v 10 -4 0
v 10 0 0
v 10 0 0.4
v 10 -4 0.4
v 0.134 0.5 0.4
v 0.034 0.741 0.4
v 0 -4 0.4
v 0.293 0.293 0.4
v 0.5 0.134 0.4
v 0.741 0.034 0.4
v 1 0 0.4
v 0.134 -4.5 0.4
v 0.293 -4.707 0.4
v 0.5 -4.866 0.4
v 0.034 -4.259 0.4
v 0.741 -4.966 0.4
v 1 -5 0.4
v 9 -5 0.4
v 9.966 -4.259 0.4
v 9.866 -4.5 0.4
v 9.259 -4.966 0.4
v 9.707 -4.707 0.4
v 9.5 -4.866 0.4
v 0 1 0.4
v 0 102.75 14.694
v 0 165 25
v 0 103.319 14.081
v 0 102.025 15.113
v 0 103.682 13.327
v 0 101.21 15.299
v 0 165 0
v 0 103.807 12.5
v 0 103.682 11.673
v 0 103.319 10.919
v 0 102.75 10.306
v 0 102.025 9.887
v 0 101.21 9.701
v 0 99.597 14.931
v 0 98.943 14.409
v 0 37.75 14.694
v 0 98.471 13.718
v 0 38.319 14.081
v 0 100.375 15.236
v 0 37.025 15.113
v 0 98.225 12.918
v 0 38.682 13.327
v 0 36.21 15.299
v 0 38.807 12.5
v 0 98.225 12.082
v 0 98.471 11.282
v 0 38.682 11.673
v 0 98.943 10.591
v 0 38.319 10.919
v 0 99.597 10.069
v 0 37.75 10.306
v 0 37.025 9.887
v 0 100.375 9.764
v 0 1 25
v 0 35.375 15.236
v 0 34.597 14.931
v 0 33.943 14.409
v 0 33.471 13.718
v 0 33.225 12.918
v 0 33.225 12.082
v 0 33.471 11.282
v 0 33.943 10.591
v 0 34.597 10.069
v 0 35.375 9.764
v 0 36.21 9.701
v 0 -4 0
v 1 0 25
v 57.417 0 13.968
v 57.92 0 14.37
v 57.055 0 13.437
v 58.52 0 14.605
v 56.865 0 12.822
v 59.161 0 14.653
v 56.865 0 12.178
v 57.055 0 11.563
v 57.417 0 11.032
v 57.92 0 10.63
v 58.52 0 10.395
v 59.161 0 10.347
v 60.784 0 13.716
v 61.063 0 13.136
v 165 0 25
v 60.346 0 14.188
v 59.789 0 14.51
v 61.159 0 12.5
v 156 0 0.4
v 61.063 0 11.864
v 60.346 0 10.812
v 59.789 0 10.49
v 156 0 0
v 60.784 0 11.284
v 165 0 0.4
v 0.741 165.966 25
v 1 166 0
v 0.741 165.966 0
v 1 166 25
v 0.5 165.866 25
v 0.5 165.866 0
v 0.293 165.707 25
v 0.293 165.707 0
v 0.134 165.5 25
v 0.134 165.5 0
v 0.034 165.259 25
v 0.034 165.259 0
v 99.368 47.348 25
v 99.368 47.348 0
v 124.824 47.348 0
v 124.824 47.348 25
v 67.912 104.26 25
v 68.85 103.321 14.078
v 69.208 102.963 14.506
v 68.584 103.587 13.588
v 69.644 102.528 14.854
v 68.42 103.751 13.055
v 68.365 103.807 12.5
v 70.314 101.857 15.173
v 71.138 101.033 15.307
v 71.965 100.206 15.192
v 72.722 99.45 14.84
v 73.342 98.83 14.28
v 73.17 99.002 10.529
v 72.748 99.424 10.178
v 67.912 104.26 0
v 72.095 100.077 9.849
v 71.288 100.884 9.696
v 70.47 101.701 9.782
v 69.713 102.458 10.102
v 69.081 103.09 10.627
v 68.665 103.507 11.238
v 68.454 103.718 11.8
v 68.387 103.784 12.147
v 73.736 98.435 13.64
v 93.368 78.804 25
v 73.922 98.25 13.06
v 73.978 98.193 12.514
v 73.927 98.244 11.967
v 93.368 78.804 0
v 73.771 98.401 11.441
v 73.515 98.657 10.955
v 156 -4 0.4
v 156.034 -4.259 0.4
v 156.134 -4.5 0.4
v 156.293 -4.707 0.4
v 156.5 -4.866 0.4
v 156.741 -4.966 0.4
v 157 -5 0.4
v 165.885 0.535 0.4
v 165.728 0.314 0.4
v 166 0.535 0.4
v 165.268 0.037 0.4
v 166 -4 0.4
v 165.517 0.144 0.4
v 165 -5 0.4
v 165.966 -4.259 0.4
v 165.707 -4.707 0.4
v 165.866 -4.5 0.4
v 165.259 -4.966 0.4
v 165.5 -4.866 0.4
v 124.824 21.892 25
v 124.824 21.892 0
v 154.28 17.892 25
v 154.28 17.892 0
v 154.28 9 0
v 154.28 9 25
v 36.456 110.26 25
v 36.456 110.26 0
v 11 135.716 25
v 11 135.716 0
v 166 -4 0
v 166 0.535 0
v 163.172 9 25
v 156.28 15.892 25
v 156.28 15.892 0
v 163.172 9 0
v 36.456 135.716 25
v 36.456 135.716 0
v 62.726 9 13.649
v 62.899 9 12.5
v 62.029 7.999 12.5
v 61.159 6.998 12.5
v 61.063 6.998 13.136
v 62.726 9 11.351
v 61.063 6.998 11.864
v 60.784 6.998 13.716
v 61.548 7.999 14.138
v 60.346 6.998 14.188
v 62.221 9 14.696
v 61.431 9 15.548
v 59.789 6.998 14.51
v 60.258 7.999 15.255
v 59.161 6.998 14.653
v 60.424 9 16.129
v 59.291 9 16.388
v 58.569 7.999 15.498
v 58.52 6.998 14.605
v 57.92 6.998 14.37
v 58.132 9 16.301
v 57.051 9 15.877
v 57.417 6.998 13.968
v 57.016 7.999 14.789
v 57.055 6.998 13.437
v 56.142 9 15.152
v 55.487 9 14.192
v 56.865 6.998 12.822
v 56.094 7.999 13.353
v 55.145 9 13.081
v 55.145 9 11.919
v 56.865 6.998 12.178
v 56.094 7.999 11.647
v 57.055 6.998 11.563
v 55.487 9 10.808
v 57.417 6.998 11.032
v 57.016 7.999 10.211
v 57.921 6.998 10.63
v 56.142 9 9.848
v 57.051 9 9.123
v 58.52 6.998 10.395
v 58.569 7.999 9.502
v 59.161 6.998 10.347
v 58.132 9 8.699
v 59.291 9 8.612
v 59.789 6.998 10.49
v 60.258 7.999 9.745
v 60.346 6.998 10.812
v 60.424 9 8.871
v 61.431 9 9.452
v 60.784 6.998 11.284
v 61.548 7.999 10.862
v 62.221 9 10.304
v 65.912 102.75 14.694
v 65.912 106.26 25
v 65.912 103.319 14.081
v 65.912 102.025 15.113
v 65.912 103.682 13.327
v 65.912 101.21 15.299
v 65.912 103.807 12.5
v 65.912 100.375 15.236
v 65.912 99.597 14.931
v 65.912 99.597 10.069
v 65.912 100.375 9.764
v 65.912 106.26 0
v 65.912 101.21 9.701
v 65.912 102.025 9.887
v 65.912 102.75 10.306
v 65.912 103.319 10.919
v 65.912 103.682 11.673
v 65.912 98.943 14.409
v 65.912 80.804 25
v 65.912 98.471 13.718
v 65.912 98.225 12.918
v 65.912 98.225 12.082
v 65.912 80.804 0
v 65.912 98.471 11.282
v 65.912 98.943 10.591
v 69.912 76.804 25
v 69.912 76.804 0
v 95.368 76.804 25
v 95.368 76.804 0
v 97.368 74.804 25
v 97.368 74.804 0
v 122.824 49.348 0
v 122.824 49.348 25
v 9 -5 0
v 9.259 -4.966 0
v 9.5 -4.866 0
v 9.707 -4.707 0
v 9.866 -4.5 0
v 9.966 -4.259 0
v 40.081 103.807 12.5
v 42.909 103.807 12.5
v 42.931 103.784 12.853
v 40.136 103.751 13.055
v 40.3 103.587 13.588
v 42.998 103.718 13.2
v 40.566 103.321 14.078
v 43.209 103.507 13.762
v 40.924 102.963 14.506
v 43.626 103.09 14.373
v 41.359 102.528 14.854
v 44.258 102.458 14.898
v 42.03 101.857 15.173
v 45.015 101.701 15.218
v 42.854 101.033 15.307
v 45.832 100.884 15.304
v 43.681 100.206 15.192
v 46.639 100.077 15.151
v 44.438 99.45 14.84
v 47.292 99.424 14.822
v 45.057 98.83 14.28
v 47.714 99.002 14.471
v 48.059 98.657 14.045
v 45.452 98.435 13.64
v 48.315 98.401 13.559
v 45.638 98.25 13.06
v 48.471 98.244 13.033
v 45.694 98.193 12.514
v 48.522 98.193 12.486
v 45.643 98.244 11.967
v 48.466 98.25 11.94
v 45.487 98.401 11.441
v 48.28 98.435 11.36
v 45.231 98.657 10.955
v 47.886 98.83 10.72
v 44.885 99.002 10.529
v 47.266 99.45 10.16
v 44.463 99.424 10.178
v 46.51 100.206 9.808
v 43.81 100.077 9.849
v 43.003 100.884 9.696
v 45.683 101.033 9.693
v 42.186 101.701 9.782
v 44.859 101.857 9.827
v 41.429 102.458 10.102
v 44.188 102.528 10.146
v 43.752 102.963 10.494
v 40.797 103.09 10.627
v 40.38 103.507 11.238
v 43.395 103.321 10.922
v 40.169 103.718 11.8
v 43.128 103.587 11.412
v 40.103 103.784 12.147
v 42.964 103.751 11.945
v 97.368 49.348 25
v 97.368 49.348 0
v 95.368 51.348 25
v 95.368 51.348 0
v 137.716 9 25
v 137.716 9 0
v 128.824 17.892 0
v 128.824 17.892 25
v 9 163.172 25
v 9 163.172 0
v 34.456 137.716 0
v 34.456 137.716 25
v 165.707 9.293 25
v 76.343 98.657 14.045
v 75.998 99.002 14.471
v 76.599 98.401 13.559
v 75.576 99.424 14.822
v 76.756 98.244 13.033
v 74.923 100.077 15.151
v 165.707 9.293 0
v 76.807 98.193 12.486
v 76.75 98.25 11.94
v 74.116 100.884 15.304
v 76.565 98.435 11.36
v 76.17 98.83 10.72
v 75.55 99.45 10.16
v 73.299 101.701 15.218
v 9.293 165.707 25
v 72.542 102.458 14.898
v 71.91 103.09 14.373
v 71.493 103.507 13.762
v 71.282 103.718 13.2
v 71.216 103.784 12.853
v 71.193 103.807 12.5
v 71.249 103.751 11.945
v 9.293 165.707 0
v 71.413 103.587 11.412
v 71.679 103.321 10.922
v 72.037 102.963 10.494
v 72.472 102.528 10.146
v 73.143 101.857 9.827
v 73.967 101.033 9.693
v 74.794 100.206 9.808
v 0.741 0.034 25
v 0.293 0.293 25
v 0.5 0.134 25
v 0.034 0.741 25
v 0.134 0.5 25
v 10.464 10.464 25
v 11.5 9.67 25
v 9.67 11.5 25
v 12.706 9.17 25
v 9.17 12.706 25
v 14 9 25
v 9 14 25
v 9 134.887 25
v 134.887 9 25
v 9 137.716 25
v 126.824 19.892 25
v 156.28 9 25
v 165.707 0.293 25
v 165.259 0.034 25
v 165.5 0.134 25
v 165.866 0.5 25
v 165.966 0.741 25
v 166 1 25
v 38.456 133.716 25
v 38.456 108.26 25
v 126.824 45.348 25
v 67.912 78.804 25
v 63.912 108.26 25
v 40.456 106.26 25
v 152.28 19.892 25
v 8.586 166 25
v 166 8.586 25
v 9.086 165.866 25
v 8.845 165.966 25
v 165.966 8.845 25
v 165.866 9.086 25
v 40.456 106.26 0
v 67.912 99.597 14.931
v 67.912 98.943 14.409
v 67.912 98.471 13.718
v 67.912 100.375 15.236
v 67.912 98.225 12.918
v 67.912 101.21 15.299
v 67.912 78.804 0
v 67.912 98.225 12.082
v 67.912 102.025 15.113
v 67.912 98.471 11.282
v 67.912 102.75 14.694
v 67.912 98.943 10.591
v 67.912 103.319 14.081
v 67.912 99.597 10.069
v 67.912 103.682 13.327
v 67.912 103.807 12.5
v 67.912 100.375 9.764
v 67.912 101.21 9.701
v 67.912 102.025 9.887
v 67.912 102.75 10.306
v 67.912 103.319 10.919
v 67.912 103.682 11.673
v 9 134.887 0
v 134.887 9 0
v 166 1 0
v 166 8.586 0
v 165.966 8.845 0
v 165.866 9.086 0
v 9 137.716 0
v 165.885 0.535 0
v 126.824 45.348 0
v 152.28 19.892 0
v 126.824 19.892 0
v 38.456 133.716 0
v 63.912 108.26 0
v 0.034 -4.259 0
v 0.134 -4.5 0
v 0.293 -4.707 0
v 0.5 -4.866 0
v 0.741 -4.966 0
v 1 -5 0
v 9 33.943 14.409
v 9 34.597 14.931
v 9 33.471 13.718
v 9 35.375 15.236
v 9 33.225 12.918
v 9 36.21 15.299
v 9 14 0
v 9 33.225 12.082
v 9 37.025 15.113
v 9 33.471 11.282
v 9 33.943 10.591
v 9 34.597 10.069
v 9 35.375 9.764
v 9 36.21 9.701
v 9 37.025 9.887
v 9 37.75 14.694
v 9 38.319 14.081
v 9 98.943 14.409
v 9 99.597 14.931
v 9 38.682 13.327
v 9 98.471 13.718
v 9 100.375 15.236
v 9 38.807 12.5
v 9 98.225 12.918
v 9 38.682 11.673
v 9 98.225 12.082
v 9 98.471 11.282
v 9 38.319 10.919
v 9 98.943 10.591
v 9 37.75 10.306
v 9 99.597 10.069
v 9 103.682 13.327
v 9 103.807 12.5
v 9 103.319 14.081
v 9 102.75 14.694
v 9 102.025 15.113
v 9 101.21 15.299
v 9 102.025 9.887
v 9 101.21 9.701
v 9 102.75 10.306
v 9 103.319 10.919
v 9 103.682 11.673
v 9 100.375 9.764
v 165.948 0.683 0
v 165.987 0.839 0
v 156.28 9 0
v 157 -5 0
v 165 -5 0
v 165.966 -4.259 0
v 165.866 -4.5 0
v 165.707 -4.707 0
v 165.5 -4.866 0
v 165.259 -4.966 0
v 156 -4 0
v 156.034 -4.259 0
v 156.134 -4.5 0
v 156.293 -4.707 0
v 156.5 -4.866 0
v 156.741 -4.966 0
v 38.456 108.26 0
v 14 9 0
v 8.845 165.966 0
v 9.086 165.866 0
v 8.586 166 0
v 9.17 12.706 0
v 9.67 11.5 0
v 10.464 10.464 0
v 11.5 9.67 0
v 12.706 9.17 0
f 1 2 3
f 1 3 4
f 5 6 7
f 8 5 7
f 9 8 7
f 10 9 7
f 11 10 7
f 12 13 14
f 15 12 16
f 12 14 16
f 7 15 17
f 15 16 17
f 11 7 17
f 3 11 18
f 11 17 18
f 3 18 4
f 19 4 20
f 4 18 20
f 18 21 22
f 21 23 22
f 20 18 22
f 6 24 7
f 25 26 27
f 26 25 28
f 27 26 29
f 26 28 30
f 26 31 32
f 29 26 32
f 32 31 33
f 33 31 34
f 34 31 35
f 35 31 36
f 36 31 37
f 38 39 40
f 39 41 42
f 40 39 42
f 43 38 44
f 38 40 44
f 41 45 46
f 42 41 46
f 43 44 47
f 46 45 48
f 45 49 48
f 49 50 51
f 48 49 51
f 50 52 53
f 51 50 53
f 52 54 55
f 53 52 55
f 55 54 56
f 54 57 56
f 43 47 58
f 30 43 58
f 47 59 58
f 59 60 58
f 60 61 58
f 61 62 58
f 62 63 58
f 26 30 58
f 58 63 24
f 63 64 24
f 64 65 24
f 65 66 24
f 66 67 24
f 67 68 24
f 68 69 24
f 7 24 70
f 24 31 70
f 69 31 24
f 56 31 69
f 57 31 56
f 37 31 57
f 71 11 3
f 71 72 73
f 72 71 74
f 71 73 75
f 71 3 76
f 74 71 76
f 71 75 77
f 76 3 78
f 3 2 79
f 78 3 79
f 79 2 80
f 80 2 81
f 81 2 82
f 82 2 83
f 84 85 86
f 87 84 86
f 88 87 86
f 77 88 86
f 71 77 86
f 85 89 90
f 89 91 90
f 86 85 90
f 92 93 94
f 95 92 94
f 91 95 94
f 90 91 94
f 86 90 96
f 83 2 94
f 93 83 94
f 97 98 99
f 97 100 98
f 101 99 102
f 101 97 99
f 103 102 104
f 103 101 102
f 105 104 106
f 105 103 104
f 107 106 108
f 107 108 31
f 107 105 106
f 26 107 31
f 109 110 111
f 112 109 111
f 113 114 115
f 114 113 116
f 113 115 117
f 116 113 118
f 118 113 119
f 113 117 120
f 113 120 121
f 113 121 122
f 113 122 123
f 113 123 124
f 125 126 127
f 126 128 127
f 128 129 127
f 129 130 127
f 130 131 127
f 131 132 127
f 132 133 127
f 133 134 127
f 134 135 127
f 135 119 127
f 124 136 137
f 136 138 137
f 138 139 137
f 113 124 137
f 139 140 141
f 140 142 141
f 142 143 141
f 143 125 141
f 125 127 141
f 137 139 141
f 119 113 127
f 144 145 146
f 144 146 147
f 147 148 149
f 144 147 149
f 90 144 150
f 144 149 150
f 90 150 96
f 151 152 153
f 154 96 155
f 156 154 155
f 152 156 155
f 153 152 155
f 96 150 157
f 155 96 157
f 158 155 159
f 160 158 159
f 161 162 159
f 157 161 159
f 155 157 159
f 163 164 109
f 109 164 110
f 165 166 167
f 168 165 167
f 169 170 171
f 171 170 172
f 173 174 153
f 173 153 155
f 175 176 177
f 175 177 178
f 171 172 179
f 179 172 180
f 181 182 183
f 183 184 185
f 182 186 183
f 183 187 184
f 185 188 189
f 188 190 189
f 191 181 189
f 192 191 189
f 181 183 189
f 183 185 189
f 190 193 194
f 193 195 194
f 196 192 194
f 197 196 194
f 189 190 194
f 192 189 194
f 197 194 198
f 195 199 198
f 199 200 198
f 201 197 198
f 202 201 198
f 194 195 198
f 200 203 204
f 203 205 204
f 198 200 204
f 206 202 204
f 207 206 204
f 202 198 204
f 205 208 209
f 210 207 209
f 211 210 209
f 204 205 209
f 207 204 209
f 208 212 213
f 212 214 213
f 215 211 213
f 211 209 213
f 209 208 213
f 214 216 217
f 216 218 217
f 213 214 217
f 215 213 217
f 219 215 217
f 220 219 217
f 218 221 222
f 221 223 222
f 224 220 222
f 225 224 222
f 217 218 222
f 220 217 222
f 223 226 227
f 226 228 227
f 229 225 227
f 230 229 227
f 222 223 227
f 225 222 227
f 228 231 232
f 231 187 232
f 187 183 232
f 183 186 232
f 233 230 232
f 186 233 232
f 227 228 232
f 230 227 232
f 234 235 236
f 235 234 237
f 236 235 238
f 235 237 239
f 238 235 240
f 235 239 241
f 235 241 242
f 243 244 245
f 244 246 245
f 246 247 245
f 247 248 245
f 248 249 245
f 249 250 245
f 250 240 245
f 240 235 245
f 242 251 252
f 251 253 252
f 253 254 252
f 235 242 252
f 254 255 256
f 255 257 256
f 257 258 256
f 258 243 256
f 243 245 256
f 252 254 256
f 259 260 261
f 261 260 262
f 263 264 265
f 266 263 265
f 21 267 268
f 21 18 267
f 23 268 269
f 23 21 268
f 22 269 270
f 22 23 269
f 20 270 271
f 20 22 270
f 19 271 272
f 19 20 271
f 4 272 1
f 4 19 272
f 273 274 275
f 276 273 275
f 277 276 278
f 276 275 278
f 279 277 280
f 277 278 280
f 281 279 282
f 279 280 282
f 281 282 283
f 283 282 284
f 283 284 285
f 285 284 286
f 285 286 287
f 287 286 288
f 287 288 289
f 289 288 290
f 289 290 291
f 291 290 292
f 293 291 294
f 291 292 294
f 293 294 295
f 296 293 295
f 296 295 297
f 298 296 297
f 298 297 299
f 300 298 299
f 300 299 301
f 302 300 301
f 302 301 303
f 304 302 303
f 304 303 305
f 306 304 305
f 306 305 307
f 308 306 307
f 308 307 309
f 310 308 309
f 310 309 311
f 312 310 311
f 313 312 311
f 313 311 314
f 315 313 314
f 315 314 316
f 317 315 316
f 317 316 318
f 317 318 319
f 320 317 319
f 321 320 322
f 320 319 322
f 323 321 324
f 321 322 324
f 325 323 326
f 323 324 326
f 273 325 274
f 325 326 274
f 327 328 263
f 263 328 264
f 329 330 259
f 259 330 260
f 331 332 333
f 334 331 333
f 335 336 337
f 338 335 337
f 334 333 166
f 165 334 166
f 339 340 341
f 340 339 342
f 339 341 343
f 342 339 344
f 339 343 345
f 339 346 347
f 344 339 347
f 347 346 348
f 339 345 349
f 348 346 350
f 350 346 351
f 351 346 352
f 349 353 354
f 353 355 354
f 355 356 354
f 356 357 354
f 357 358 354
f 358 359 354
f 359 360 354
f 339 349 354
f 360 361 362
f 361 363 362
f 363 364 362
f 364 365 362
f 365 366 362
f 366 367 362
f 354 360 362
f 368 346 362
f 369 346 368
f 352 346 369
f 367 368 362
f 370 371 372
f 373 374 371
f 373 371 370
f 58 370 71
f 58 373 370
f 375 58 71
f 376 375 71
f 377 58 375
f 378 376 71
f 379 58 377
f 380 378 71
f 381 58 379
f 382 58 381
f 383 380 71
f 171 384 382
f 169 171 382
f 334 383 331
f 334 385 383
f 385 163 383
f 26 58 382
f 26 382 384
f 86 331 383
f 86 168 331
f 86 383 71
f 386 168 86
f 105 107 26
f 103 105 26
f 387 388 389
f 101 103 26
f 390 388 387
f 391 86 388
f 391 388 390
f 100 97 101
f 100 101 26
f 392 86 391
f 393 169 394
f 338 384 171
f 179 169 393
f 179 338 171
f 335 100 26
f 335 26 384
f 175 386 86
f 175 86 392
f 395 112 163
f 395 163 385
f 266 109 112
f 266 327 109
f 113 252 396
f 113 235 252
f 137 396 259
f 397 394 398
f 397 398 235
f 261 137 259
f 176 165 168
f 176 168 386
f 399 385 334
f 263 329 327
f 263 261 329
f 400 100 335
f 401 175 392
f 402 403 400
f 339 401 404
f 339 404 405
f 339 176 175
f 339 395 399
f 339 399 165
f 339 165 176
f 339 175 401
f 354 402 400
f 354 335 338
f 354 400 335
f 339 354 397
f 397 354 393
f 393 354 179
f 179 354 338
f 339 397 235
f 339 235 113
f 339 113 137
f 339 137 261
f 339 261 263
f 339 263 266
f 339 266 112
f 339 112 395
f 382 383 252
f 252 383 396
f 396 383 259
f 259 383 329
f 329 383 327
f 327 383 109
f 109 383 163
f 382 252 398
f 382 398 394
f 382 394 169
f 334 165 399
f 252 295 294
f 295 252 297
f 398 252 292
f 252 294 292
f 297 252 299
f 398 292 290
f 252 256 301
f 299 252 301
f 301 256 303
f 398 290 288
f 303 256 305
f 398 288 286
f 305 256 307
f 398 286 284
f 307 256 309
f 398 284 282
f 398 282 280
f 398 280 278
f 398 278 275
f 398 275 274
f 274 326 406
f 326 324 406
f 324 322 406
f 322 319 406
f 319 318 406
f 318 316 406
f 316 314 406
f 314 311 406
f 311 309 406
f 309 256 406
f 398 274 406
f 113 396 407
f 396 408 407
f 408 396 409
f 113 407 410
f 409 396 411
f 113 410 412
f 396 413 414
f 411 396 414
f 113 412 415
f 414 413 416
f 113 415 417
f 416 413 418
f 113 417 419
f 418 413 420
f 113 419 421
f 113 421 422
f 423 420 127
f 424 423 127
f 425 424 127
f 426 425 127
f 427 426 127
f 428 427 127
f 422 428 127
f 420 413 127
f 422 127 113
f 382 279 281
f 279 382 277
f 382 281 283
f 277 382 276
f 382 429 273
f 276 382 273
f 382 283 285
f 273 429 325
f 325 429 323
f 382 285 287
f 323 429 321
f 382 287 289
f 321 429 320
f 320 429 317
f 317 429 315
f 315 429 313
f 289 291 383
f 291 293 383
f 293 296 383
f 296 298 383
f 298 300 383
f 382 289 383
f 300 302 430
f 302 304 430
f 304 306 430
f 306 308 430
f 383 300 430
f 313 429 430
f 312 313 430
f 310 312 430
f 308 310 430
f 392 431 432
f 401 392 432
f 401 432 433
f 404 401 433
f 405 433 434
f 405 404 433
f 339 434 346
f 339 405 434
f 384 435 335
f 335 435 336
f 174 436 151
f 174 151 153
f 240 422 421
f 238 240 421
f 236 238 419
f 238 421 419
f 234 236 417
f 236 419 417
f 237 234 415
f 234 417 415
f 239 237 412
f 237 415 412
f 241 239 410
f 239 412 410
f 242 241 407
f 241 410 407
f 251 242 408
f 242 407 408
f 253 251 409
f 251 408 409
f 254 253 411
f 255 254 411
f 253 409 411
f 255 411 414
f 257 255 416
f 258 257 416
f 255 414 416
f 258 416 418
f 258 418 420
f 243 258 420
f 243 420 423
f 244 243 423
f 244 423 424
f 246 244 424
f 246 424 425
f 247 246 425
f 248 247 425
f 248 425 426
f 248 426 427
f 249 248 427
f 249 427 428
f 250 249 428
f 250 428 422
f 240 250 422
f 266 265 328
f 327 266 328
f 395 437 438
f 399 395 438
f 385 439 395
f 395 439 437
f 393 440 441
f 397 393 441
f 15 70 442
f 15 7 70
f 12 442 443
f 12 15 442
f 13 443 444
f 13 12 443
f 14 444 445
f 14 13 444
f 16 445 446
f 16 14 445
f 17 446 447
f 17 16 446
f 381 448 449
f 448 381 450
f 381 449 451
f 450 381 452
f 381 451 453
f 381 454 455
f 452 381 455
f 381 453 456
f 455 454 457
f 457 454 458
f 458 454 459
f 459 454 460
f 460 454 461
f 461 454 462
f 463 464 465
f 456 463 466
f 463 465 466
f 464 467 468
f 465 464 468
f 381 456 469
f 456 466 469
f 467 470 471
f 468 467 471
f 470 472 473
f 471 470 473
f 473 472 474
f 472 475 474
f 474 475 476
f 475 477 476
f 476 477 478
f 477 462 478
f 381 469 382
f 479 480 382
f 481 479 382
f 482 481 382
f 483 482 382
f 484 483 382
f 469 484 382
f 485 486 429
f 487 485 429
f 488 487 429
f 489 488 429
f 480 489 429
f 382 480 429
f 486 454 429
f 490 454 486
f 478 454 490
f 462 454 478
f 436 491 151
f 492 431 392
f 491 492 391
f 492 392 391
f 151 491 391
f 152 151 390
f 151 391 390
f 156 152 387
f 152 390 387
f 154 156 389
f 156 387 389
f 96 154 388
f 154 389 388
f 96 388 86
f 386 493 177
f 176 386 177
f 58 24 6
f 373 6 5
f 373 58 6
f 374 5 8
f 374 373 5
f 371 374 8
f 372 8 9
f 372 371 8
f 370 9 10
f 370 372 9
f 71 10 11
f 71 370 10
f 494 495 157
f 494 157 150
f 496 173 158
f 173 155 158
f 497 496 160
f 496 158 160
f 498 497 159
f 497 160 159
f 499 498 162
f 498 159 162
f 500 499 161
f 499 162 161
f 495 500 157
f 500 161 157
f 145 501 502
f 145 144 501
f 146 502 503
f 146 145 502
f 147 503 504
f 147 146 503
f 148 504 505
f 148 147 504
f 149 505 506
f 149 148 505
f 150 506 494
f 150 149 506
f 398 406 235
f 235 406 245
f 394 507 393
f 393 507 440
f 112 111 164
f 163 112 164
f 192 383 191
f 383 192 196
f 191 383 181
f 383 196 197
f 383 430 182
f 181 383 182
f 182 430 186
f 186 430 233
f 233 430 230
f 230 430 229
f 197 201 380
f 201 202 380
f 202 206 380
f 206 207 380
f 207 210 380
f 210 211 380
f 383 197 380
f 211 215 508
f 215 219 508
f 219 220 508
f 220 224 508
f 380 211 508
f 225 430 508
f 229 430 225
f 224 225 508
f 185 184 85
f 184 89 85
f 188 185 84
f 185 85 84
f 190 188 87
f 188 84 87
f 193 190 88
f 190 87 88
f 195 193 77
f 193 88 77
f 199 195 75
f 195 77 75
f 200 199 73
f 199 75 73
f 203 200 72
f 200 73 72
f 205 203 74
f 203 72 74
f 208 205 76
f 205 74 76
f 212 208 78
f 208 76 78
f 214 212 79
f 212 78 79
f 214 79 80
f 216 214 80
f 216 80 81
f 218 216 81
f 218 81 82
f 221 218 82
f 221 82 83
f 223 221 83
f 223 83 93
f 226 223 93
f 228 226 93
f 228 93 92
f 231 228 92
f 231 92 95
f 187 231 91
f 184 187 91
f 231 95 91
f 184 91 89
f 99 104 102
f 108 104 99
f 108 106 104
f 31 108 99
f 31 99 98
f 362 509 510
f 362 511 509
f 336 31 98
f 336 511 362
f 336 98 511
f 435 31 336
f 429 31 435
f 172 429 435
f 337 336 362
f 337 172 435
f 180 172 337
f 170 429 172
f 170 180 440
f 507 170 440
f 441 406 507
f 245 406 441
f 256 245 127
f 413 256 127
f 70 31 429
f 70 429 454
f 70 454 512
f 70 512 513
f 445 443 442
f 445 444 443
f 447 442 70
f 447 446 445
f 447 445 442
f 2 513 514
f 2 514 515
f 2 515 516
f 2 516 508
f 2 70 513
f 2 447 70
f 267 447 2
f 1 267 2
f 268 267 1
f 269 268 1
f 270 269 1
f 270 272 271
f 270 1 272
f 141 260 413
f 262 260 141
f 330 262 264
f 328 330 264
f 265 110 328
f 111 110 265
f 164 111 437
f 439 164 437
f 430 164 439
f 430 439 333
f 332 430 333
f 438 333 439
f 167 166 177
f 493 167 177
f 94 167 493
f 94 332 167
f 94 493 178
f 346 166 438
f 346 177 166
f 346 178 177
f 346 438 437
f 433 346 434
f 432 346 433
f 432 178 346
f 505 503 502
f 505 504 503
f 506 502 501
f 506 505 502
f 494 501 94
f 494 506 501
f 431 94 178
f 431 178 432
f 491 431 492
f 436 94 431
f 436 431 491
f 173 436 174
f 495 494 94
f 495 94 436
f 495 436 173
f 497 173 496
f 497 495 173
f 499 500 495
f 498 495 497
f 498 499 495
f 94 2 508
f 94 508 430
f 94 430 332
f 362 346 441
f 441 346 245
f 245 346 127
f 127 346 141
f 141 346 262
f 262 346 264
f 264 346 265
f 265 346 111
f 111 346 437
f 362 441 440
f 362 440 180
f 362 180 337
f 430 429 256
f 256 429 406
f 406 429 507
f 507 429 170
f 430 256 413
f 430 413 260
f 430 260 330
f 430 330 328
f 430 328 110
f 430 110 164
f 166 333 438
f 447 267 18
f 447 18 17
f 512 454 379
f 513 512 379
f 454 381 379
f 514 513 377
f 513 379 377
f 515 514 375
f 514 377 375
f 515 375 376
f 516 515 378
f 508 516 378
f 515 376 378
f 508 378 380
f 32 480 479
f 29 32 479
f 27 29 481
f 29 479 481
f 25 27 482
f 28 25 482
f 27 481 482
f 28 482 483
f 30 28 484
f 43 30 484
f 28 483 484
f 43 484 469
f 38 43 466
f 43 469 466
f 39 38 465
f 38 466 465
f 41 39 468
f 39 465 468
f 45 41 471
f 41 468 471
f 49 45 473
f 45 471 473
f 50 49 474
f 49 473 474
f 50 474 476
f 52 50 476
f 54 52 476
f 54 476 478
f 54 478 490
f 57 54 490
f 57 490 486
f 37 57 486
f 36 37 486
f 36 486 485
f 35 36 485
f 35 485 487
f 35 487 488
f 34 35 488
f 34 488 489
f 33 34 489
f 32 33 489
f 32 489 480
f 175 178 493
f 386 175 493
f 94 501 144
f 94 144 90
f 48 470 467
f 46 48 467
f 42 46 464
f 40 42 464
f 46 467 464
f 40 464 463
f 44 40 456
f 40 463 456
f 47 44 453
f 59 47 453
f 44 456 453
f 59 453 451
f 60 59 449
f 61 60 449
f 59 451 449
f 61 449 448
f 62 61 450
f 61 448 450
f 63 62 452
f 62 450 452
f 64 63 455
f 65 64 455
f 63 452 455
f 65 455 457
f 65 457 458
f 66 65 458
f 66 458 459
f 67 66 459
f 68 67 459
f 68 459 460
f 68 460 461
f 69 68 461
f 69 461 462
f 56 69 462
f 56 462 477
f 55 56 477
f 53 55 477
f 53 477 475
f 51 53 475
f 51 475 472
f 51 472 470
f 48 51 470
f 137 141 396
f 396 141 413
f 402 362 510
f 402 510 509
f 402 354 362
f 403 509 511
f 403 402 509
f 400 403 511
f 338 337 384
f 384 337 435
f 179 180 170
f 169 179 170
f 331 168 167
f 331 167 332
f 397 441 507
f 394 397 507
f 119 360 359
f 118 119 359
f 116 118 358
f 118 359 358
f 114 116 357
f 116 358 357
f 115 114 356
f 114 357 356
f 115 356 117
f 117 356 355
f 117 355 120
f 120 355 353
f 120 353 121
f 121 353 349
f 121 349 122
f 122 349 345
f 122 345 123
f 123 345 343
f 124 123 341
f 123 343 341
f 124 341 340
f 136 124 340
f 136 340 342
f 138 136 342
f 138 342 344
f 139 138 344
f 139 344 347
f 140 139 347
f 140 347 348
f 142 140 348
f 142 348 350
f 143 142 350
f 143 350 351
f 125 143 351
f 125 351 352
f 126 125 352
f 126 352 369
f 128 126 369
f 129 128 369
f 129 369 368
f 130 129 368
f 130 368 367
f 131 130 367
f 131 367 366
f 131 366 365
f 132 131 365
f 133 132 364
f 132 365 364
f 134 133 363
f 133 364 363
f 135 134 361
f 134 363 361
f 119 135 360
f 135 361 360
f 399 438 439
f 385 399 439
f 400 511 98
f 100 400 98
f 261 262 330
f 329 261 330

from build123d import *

# Parameters (mm, degrees)
F0_W           = 2
F0_H           = 9
F1_DEPTH       = 25
F3_D           = 5.6134
F3_DEPTH       = 25
F3_TIP         = 1.6864354994
F5_D           = 5.6134
F5_DEPTH       = 85
F5_TIP         = 1.6864354994
F7_D           = 4.318
F7_DEPTH       = 25
F7_CSINK_D     = 7.7978
F7_CSINK_ANGLE = 82
F7_TIP         = 1.2972580765
F8_R           = 5
F9_R           = 1
F11_DEPTH      = 0.4
F12_R          = 1


# Not quite as in the source:
# - a feature names something its author has since deleted; it is built from what else it names


with BuildPart() as f1:
    # F0 (on Top) → F1 (new body)
    with BuildSketch(Plane.XY):
        Polygon((0, 166), (0, 0), (154.2796328583, 0), (154.2796328583, 9), (137.7157287525, 9), (134.8873016278, 9), (9, 9), (9, 134.8873016278), (9, 137.7157287525), (9, 138.1715728753), (9, 163.1715728753), (9, 166), align=None)
        Polygon((36.4558441227, 135.7157287525), (34.4558441227, 137.7157287525), (9, 137.7157287525), (11, 135.7157287525), align=None)
        Polygon((38.4558441227, 133.7157287525), (36.4558441227, 135.7157287525), (36.4558441227, 110.2598846298), (38.4558441227, 108.2598846298), align=None)
        Polygon((134.8873016278, 9), (137.7157287525, 9), (128.8237887356, 17.891940017), (126.8237887356, 19.891940017), (126.8236856744, 19.8920430782), (124.8236856744, 21.8920430782), (99.3678415517, 47.3478872009), (97.3678415517, 49.3478872009), (97.3677384905, 49.347990262), (95.3677384905, 51.347990262), (69.9118943678, 76.8038343848), (67.9118943678, 78.8038343848), (67.9117913066, 78.8039374459), (65.9117913066, 80.8039374459), (40.4559471839, 106.2597815687), (38.4559471839, 108.2597815687), (38.4558441227, 108.2598846298), (36.4558441227, 110.2598846298), (11, 135.7157287525), (9, 137.7157287525), (9, 134.8873016278), align=None)
        Polygon((166, 9), (9, 166), (9, 163.1715728753), (34.4558441227, 137.7157287525), (36.4558441227, 135.7157287525), (38.4558441227, 133.7157287525), (63.9117913066, 108.2597815687), (65.9117913066, 106.2597815687), (67.9117913066, 104.2597815687), (93.3677384905, 78.8038343848), (95.3677384905, 76.8038343848), (97.3677384905, 74.8038343848), (122.8236856744, 49.3478872009), (124.8236856744, 47.3478872009), (126.8236856744, 45.3478872009), (150.2702352589, 21.9013376164), (152.2796328583, 19.891940017), (154.2796328583, 17.891940017), (156.2796328583, 15.891940017), (163.1715728753, 9), align=None)
        Polygon((65.9117913066, 106.2597815687), (63.9117913066, 108.2597815687), (38.4559471839, 108.2597815687), (40.4559471839, 106.2597815687), align=None)
        Polygon((67.9117913066, 104.2597815687), (65.9117913066, 106.2597815687), (65.9117913066, 80.8039374459), (67.9117913066, 78.8039374459), align=None)
        Polygon((95.3677384905, 76.8038343848), (93.3677384905, 78.8038343848), (67.9118943678, 78.8038343848), (69.9118943678, 76.8038343848), align=None)
        Polygon((97.3677384905, 49.347990262), (97.3677384905, 74.8038343848), (95.3677384905, 76.8038343848), (95.3677384905, 51.347990262), align=None)
        Polygon((99.3678415517, 47.3478872009), (124.8236856744, 47.3478872009), (122.8236856744, 49.3478872009), (97.3678415517, 49.3478872009), align=None)
        Polygon((124.8236856744, 21.8920430782), (126.8236856744, 19.8920430782), (126.8236856744, 45.3478872009), (124.8236856744, 47.3478872009), align=None)
        Polygon((128.8237887356, 17.891940017), (154.2796328583, 17.891940017), (152.2796328583, 19.891940017), (126.8237887356, 19.891940017), align=None)
        Polygon((154.2796328583, 17.891940017), (154.2796328583, 9), (156.2796328583, 9), (156.2796328583, 15.891940017), align=None)
        with Locations((155.2796328583, 4.5)):
            Rectangle(F0_W, F0_H)
        Polygon((156.2796328583, 9), (156.2796328583, 0), (166, 0), (166, 6.1715728753), (163.1715728753, 9), align=None)
        Polygon((166, 6.1715728753), (166, 9), (163.1715728753, 9), align=None)
    extrude(amount=F1_DEPTH)

    # F3
    with Locations(Plane(origin=(0, 0, 0), x_dir=(0, -1, 0), z_dir=(-1, 0, 0))):
        with Locations((-36, 12.5)):
            Hole(F3_D / 2, depth=F3_DEPTH)
            with Locations((0, 0, -(F3_DEPTH + F3_TIP / 2))):  # 118° drill point
                Cone(0, F3_D / 2, F3_TIP, mode=Mode.SUBTRACT)

    # F5
    with Locations(Plane(origin=(0, 0, 0), x_dir=(0, -1, 0), z_dir=(-1, 0, 0))):
        with Locations((-101, 12.5)):
            Hole(F5_D / 2, depth=F5_DEPTH)
            with Locations((0, 0, -(F5_DEPTH + F5_TIP / 2))):  # 118° drill point
                Cone(0, F5_D / 2, F5_TIP, mode=Mode.SUBTRACT)

    # F7
    with Locations(Plane(origin=(0, 9, 0), x_dir=(-1, 0, 0), z_dir=(0, 1, 0))):
        with Locations((-59, 12.5)):
            CounterSinkHole(F7_D / 2, F7_CSINK_D / 2, depth=F7_DEPTH, counter_sink_angle=F7_CSINK_ANGLE)
            with Locations((0, 0, -(F7_DEPTH + F7_TIP / 2))):  # 118° drill point
                Cone(0, F7_D / 2, F7_TIP, mode=Mode.SUBTRACT)

    # F8
    f8_edges = [f1.edges().sort_by_distance(p)[0] for p in [
        (9, 9, 12.5),
    ]]
    fillet(f8_edges, radius=F8_R)

    # F9
    f9_edges = [f1.edges().sort_by_distance(p)[0] for p in [
        (166, 9, 12.5),
        (166, 0, 12.5),
        (0, 0, 12.5),
        (0, 166, 12.5),
        (9, 166, 12.5),
    ]]
    fillet(f9_edges, radius=F9_R)

    # F10 (on face) → F11 (join)
    with BuildSketch(Plane(origin=(0, 0, 0), x_dir=(1, 0, 0), z_dir=(0, 0, -1))):
        with BuildLine():
            Line((156, 5), (156, 0))
            Line((156, 0), (165, 0))
            ThreePointArc((165, 0), (165.5171897304, -0.1441292254), (165.8852951503, -0.5349704344))
            Line((165.8852951503, -0.5349704344), (166, -0.5349704344))
            Line((166, -0.5349704344), (166, 5))
            Line((166, 5), (156, 5))
        make_face()
        with BuildLine():
            Line((0, 5), (0, -1))
            ThreePointArc((0, -1), (0.2928932188, -0.2928932188), (1, 0))
            Line((1, 0), (10, 0))
            Line((10, 0), (10, 5))
            Line((10, 5), (0, 5))
        make_face()
    extrude(amount=-F11_DEPTH)

    # F12
    f12_edges = [f1.edges().sort_by_distance(p)[0] for p in [
        (166, -5, 0.2),
        (156, -5, 0.2),
        (0, -5, 0.2),
        (10, -5, 0.2),
    ]]
    fillet(f12_edges, radius=F12_R)


solid = f1.part
